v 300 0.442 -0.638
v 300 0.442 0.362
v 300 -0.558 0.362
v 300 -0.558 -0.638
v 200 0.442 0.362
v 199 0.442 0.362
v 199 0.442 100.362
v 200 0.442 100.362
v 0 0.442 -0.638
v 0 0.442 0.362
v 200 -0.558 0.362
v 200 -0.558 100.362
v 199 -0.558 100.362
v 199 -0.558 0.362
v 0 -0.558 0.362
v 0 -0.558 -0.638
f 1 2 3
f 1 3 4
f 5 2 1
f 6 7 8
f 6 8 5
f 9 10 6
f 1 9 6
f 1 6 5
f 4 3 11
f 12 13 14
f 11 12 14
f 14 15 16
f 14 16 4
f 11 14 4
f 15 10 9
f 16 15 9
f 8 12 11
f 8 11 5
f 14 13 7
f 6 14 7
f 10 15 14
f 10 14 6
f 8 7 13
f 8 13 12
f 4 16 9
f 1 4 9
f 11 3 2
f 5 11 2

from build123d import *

# Parameters (mm, degrees)
SKETCH1_W           = 1
SKETCH1_H           = 1
BOSS_EXTRUDE1_DEPTH = 300
SKETCH2_W           = 1
SKETCH2_H           = 1
BOSS_EXTRUDE2_DEPTH = 100


with BuildPart() as part:
    # Sketch1 → Boss-Extrude1 (new body)
    with BuildSketch(Plane(origin=(0, 0, 0), x_dir=(0, 0, -1), z_dir=(1, 0, 0))):
        with Locations((0.137681159, -0.057971014)):
            Rectangle(SKETCH1_W, SKETCH1_H)
    extrude(amount=BOSS_EXTRUDE1_DEPTH)

    # Sketch2 → Boss-Extrude2 (add)
    with BuildSketch(Plane.XY.offset(0.362318841)):
        with Locations((199.5, -0.057971014)):
            Rectangle(SKETCH2_W, SKETCH2_H)
    extrude(amount=BOSS_EXTRUDE2_DEPTH)


solid = part.part
